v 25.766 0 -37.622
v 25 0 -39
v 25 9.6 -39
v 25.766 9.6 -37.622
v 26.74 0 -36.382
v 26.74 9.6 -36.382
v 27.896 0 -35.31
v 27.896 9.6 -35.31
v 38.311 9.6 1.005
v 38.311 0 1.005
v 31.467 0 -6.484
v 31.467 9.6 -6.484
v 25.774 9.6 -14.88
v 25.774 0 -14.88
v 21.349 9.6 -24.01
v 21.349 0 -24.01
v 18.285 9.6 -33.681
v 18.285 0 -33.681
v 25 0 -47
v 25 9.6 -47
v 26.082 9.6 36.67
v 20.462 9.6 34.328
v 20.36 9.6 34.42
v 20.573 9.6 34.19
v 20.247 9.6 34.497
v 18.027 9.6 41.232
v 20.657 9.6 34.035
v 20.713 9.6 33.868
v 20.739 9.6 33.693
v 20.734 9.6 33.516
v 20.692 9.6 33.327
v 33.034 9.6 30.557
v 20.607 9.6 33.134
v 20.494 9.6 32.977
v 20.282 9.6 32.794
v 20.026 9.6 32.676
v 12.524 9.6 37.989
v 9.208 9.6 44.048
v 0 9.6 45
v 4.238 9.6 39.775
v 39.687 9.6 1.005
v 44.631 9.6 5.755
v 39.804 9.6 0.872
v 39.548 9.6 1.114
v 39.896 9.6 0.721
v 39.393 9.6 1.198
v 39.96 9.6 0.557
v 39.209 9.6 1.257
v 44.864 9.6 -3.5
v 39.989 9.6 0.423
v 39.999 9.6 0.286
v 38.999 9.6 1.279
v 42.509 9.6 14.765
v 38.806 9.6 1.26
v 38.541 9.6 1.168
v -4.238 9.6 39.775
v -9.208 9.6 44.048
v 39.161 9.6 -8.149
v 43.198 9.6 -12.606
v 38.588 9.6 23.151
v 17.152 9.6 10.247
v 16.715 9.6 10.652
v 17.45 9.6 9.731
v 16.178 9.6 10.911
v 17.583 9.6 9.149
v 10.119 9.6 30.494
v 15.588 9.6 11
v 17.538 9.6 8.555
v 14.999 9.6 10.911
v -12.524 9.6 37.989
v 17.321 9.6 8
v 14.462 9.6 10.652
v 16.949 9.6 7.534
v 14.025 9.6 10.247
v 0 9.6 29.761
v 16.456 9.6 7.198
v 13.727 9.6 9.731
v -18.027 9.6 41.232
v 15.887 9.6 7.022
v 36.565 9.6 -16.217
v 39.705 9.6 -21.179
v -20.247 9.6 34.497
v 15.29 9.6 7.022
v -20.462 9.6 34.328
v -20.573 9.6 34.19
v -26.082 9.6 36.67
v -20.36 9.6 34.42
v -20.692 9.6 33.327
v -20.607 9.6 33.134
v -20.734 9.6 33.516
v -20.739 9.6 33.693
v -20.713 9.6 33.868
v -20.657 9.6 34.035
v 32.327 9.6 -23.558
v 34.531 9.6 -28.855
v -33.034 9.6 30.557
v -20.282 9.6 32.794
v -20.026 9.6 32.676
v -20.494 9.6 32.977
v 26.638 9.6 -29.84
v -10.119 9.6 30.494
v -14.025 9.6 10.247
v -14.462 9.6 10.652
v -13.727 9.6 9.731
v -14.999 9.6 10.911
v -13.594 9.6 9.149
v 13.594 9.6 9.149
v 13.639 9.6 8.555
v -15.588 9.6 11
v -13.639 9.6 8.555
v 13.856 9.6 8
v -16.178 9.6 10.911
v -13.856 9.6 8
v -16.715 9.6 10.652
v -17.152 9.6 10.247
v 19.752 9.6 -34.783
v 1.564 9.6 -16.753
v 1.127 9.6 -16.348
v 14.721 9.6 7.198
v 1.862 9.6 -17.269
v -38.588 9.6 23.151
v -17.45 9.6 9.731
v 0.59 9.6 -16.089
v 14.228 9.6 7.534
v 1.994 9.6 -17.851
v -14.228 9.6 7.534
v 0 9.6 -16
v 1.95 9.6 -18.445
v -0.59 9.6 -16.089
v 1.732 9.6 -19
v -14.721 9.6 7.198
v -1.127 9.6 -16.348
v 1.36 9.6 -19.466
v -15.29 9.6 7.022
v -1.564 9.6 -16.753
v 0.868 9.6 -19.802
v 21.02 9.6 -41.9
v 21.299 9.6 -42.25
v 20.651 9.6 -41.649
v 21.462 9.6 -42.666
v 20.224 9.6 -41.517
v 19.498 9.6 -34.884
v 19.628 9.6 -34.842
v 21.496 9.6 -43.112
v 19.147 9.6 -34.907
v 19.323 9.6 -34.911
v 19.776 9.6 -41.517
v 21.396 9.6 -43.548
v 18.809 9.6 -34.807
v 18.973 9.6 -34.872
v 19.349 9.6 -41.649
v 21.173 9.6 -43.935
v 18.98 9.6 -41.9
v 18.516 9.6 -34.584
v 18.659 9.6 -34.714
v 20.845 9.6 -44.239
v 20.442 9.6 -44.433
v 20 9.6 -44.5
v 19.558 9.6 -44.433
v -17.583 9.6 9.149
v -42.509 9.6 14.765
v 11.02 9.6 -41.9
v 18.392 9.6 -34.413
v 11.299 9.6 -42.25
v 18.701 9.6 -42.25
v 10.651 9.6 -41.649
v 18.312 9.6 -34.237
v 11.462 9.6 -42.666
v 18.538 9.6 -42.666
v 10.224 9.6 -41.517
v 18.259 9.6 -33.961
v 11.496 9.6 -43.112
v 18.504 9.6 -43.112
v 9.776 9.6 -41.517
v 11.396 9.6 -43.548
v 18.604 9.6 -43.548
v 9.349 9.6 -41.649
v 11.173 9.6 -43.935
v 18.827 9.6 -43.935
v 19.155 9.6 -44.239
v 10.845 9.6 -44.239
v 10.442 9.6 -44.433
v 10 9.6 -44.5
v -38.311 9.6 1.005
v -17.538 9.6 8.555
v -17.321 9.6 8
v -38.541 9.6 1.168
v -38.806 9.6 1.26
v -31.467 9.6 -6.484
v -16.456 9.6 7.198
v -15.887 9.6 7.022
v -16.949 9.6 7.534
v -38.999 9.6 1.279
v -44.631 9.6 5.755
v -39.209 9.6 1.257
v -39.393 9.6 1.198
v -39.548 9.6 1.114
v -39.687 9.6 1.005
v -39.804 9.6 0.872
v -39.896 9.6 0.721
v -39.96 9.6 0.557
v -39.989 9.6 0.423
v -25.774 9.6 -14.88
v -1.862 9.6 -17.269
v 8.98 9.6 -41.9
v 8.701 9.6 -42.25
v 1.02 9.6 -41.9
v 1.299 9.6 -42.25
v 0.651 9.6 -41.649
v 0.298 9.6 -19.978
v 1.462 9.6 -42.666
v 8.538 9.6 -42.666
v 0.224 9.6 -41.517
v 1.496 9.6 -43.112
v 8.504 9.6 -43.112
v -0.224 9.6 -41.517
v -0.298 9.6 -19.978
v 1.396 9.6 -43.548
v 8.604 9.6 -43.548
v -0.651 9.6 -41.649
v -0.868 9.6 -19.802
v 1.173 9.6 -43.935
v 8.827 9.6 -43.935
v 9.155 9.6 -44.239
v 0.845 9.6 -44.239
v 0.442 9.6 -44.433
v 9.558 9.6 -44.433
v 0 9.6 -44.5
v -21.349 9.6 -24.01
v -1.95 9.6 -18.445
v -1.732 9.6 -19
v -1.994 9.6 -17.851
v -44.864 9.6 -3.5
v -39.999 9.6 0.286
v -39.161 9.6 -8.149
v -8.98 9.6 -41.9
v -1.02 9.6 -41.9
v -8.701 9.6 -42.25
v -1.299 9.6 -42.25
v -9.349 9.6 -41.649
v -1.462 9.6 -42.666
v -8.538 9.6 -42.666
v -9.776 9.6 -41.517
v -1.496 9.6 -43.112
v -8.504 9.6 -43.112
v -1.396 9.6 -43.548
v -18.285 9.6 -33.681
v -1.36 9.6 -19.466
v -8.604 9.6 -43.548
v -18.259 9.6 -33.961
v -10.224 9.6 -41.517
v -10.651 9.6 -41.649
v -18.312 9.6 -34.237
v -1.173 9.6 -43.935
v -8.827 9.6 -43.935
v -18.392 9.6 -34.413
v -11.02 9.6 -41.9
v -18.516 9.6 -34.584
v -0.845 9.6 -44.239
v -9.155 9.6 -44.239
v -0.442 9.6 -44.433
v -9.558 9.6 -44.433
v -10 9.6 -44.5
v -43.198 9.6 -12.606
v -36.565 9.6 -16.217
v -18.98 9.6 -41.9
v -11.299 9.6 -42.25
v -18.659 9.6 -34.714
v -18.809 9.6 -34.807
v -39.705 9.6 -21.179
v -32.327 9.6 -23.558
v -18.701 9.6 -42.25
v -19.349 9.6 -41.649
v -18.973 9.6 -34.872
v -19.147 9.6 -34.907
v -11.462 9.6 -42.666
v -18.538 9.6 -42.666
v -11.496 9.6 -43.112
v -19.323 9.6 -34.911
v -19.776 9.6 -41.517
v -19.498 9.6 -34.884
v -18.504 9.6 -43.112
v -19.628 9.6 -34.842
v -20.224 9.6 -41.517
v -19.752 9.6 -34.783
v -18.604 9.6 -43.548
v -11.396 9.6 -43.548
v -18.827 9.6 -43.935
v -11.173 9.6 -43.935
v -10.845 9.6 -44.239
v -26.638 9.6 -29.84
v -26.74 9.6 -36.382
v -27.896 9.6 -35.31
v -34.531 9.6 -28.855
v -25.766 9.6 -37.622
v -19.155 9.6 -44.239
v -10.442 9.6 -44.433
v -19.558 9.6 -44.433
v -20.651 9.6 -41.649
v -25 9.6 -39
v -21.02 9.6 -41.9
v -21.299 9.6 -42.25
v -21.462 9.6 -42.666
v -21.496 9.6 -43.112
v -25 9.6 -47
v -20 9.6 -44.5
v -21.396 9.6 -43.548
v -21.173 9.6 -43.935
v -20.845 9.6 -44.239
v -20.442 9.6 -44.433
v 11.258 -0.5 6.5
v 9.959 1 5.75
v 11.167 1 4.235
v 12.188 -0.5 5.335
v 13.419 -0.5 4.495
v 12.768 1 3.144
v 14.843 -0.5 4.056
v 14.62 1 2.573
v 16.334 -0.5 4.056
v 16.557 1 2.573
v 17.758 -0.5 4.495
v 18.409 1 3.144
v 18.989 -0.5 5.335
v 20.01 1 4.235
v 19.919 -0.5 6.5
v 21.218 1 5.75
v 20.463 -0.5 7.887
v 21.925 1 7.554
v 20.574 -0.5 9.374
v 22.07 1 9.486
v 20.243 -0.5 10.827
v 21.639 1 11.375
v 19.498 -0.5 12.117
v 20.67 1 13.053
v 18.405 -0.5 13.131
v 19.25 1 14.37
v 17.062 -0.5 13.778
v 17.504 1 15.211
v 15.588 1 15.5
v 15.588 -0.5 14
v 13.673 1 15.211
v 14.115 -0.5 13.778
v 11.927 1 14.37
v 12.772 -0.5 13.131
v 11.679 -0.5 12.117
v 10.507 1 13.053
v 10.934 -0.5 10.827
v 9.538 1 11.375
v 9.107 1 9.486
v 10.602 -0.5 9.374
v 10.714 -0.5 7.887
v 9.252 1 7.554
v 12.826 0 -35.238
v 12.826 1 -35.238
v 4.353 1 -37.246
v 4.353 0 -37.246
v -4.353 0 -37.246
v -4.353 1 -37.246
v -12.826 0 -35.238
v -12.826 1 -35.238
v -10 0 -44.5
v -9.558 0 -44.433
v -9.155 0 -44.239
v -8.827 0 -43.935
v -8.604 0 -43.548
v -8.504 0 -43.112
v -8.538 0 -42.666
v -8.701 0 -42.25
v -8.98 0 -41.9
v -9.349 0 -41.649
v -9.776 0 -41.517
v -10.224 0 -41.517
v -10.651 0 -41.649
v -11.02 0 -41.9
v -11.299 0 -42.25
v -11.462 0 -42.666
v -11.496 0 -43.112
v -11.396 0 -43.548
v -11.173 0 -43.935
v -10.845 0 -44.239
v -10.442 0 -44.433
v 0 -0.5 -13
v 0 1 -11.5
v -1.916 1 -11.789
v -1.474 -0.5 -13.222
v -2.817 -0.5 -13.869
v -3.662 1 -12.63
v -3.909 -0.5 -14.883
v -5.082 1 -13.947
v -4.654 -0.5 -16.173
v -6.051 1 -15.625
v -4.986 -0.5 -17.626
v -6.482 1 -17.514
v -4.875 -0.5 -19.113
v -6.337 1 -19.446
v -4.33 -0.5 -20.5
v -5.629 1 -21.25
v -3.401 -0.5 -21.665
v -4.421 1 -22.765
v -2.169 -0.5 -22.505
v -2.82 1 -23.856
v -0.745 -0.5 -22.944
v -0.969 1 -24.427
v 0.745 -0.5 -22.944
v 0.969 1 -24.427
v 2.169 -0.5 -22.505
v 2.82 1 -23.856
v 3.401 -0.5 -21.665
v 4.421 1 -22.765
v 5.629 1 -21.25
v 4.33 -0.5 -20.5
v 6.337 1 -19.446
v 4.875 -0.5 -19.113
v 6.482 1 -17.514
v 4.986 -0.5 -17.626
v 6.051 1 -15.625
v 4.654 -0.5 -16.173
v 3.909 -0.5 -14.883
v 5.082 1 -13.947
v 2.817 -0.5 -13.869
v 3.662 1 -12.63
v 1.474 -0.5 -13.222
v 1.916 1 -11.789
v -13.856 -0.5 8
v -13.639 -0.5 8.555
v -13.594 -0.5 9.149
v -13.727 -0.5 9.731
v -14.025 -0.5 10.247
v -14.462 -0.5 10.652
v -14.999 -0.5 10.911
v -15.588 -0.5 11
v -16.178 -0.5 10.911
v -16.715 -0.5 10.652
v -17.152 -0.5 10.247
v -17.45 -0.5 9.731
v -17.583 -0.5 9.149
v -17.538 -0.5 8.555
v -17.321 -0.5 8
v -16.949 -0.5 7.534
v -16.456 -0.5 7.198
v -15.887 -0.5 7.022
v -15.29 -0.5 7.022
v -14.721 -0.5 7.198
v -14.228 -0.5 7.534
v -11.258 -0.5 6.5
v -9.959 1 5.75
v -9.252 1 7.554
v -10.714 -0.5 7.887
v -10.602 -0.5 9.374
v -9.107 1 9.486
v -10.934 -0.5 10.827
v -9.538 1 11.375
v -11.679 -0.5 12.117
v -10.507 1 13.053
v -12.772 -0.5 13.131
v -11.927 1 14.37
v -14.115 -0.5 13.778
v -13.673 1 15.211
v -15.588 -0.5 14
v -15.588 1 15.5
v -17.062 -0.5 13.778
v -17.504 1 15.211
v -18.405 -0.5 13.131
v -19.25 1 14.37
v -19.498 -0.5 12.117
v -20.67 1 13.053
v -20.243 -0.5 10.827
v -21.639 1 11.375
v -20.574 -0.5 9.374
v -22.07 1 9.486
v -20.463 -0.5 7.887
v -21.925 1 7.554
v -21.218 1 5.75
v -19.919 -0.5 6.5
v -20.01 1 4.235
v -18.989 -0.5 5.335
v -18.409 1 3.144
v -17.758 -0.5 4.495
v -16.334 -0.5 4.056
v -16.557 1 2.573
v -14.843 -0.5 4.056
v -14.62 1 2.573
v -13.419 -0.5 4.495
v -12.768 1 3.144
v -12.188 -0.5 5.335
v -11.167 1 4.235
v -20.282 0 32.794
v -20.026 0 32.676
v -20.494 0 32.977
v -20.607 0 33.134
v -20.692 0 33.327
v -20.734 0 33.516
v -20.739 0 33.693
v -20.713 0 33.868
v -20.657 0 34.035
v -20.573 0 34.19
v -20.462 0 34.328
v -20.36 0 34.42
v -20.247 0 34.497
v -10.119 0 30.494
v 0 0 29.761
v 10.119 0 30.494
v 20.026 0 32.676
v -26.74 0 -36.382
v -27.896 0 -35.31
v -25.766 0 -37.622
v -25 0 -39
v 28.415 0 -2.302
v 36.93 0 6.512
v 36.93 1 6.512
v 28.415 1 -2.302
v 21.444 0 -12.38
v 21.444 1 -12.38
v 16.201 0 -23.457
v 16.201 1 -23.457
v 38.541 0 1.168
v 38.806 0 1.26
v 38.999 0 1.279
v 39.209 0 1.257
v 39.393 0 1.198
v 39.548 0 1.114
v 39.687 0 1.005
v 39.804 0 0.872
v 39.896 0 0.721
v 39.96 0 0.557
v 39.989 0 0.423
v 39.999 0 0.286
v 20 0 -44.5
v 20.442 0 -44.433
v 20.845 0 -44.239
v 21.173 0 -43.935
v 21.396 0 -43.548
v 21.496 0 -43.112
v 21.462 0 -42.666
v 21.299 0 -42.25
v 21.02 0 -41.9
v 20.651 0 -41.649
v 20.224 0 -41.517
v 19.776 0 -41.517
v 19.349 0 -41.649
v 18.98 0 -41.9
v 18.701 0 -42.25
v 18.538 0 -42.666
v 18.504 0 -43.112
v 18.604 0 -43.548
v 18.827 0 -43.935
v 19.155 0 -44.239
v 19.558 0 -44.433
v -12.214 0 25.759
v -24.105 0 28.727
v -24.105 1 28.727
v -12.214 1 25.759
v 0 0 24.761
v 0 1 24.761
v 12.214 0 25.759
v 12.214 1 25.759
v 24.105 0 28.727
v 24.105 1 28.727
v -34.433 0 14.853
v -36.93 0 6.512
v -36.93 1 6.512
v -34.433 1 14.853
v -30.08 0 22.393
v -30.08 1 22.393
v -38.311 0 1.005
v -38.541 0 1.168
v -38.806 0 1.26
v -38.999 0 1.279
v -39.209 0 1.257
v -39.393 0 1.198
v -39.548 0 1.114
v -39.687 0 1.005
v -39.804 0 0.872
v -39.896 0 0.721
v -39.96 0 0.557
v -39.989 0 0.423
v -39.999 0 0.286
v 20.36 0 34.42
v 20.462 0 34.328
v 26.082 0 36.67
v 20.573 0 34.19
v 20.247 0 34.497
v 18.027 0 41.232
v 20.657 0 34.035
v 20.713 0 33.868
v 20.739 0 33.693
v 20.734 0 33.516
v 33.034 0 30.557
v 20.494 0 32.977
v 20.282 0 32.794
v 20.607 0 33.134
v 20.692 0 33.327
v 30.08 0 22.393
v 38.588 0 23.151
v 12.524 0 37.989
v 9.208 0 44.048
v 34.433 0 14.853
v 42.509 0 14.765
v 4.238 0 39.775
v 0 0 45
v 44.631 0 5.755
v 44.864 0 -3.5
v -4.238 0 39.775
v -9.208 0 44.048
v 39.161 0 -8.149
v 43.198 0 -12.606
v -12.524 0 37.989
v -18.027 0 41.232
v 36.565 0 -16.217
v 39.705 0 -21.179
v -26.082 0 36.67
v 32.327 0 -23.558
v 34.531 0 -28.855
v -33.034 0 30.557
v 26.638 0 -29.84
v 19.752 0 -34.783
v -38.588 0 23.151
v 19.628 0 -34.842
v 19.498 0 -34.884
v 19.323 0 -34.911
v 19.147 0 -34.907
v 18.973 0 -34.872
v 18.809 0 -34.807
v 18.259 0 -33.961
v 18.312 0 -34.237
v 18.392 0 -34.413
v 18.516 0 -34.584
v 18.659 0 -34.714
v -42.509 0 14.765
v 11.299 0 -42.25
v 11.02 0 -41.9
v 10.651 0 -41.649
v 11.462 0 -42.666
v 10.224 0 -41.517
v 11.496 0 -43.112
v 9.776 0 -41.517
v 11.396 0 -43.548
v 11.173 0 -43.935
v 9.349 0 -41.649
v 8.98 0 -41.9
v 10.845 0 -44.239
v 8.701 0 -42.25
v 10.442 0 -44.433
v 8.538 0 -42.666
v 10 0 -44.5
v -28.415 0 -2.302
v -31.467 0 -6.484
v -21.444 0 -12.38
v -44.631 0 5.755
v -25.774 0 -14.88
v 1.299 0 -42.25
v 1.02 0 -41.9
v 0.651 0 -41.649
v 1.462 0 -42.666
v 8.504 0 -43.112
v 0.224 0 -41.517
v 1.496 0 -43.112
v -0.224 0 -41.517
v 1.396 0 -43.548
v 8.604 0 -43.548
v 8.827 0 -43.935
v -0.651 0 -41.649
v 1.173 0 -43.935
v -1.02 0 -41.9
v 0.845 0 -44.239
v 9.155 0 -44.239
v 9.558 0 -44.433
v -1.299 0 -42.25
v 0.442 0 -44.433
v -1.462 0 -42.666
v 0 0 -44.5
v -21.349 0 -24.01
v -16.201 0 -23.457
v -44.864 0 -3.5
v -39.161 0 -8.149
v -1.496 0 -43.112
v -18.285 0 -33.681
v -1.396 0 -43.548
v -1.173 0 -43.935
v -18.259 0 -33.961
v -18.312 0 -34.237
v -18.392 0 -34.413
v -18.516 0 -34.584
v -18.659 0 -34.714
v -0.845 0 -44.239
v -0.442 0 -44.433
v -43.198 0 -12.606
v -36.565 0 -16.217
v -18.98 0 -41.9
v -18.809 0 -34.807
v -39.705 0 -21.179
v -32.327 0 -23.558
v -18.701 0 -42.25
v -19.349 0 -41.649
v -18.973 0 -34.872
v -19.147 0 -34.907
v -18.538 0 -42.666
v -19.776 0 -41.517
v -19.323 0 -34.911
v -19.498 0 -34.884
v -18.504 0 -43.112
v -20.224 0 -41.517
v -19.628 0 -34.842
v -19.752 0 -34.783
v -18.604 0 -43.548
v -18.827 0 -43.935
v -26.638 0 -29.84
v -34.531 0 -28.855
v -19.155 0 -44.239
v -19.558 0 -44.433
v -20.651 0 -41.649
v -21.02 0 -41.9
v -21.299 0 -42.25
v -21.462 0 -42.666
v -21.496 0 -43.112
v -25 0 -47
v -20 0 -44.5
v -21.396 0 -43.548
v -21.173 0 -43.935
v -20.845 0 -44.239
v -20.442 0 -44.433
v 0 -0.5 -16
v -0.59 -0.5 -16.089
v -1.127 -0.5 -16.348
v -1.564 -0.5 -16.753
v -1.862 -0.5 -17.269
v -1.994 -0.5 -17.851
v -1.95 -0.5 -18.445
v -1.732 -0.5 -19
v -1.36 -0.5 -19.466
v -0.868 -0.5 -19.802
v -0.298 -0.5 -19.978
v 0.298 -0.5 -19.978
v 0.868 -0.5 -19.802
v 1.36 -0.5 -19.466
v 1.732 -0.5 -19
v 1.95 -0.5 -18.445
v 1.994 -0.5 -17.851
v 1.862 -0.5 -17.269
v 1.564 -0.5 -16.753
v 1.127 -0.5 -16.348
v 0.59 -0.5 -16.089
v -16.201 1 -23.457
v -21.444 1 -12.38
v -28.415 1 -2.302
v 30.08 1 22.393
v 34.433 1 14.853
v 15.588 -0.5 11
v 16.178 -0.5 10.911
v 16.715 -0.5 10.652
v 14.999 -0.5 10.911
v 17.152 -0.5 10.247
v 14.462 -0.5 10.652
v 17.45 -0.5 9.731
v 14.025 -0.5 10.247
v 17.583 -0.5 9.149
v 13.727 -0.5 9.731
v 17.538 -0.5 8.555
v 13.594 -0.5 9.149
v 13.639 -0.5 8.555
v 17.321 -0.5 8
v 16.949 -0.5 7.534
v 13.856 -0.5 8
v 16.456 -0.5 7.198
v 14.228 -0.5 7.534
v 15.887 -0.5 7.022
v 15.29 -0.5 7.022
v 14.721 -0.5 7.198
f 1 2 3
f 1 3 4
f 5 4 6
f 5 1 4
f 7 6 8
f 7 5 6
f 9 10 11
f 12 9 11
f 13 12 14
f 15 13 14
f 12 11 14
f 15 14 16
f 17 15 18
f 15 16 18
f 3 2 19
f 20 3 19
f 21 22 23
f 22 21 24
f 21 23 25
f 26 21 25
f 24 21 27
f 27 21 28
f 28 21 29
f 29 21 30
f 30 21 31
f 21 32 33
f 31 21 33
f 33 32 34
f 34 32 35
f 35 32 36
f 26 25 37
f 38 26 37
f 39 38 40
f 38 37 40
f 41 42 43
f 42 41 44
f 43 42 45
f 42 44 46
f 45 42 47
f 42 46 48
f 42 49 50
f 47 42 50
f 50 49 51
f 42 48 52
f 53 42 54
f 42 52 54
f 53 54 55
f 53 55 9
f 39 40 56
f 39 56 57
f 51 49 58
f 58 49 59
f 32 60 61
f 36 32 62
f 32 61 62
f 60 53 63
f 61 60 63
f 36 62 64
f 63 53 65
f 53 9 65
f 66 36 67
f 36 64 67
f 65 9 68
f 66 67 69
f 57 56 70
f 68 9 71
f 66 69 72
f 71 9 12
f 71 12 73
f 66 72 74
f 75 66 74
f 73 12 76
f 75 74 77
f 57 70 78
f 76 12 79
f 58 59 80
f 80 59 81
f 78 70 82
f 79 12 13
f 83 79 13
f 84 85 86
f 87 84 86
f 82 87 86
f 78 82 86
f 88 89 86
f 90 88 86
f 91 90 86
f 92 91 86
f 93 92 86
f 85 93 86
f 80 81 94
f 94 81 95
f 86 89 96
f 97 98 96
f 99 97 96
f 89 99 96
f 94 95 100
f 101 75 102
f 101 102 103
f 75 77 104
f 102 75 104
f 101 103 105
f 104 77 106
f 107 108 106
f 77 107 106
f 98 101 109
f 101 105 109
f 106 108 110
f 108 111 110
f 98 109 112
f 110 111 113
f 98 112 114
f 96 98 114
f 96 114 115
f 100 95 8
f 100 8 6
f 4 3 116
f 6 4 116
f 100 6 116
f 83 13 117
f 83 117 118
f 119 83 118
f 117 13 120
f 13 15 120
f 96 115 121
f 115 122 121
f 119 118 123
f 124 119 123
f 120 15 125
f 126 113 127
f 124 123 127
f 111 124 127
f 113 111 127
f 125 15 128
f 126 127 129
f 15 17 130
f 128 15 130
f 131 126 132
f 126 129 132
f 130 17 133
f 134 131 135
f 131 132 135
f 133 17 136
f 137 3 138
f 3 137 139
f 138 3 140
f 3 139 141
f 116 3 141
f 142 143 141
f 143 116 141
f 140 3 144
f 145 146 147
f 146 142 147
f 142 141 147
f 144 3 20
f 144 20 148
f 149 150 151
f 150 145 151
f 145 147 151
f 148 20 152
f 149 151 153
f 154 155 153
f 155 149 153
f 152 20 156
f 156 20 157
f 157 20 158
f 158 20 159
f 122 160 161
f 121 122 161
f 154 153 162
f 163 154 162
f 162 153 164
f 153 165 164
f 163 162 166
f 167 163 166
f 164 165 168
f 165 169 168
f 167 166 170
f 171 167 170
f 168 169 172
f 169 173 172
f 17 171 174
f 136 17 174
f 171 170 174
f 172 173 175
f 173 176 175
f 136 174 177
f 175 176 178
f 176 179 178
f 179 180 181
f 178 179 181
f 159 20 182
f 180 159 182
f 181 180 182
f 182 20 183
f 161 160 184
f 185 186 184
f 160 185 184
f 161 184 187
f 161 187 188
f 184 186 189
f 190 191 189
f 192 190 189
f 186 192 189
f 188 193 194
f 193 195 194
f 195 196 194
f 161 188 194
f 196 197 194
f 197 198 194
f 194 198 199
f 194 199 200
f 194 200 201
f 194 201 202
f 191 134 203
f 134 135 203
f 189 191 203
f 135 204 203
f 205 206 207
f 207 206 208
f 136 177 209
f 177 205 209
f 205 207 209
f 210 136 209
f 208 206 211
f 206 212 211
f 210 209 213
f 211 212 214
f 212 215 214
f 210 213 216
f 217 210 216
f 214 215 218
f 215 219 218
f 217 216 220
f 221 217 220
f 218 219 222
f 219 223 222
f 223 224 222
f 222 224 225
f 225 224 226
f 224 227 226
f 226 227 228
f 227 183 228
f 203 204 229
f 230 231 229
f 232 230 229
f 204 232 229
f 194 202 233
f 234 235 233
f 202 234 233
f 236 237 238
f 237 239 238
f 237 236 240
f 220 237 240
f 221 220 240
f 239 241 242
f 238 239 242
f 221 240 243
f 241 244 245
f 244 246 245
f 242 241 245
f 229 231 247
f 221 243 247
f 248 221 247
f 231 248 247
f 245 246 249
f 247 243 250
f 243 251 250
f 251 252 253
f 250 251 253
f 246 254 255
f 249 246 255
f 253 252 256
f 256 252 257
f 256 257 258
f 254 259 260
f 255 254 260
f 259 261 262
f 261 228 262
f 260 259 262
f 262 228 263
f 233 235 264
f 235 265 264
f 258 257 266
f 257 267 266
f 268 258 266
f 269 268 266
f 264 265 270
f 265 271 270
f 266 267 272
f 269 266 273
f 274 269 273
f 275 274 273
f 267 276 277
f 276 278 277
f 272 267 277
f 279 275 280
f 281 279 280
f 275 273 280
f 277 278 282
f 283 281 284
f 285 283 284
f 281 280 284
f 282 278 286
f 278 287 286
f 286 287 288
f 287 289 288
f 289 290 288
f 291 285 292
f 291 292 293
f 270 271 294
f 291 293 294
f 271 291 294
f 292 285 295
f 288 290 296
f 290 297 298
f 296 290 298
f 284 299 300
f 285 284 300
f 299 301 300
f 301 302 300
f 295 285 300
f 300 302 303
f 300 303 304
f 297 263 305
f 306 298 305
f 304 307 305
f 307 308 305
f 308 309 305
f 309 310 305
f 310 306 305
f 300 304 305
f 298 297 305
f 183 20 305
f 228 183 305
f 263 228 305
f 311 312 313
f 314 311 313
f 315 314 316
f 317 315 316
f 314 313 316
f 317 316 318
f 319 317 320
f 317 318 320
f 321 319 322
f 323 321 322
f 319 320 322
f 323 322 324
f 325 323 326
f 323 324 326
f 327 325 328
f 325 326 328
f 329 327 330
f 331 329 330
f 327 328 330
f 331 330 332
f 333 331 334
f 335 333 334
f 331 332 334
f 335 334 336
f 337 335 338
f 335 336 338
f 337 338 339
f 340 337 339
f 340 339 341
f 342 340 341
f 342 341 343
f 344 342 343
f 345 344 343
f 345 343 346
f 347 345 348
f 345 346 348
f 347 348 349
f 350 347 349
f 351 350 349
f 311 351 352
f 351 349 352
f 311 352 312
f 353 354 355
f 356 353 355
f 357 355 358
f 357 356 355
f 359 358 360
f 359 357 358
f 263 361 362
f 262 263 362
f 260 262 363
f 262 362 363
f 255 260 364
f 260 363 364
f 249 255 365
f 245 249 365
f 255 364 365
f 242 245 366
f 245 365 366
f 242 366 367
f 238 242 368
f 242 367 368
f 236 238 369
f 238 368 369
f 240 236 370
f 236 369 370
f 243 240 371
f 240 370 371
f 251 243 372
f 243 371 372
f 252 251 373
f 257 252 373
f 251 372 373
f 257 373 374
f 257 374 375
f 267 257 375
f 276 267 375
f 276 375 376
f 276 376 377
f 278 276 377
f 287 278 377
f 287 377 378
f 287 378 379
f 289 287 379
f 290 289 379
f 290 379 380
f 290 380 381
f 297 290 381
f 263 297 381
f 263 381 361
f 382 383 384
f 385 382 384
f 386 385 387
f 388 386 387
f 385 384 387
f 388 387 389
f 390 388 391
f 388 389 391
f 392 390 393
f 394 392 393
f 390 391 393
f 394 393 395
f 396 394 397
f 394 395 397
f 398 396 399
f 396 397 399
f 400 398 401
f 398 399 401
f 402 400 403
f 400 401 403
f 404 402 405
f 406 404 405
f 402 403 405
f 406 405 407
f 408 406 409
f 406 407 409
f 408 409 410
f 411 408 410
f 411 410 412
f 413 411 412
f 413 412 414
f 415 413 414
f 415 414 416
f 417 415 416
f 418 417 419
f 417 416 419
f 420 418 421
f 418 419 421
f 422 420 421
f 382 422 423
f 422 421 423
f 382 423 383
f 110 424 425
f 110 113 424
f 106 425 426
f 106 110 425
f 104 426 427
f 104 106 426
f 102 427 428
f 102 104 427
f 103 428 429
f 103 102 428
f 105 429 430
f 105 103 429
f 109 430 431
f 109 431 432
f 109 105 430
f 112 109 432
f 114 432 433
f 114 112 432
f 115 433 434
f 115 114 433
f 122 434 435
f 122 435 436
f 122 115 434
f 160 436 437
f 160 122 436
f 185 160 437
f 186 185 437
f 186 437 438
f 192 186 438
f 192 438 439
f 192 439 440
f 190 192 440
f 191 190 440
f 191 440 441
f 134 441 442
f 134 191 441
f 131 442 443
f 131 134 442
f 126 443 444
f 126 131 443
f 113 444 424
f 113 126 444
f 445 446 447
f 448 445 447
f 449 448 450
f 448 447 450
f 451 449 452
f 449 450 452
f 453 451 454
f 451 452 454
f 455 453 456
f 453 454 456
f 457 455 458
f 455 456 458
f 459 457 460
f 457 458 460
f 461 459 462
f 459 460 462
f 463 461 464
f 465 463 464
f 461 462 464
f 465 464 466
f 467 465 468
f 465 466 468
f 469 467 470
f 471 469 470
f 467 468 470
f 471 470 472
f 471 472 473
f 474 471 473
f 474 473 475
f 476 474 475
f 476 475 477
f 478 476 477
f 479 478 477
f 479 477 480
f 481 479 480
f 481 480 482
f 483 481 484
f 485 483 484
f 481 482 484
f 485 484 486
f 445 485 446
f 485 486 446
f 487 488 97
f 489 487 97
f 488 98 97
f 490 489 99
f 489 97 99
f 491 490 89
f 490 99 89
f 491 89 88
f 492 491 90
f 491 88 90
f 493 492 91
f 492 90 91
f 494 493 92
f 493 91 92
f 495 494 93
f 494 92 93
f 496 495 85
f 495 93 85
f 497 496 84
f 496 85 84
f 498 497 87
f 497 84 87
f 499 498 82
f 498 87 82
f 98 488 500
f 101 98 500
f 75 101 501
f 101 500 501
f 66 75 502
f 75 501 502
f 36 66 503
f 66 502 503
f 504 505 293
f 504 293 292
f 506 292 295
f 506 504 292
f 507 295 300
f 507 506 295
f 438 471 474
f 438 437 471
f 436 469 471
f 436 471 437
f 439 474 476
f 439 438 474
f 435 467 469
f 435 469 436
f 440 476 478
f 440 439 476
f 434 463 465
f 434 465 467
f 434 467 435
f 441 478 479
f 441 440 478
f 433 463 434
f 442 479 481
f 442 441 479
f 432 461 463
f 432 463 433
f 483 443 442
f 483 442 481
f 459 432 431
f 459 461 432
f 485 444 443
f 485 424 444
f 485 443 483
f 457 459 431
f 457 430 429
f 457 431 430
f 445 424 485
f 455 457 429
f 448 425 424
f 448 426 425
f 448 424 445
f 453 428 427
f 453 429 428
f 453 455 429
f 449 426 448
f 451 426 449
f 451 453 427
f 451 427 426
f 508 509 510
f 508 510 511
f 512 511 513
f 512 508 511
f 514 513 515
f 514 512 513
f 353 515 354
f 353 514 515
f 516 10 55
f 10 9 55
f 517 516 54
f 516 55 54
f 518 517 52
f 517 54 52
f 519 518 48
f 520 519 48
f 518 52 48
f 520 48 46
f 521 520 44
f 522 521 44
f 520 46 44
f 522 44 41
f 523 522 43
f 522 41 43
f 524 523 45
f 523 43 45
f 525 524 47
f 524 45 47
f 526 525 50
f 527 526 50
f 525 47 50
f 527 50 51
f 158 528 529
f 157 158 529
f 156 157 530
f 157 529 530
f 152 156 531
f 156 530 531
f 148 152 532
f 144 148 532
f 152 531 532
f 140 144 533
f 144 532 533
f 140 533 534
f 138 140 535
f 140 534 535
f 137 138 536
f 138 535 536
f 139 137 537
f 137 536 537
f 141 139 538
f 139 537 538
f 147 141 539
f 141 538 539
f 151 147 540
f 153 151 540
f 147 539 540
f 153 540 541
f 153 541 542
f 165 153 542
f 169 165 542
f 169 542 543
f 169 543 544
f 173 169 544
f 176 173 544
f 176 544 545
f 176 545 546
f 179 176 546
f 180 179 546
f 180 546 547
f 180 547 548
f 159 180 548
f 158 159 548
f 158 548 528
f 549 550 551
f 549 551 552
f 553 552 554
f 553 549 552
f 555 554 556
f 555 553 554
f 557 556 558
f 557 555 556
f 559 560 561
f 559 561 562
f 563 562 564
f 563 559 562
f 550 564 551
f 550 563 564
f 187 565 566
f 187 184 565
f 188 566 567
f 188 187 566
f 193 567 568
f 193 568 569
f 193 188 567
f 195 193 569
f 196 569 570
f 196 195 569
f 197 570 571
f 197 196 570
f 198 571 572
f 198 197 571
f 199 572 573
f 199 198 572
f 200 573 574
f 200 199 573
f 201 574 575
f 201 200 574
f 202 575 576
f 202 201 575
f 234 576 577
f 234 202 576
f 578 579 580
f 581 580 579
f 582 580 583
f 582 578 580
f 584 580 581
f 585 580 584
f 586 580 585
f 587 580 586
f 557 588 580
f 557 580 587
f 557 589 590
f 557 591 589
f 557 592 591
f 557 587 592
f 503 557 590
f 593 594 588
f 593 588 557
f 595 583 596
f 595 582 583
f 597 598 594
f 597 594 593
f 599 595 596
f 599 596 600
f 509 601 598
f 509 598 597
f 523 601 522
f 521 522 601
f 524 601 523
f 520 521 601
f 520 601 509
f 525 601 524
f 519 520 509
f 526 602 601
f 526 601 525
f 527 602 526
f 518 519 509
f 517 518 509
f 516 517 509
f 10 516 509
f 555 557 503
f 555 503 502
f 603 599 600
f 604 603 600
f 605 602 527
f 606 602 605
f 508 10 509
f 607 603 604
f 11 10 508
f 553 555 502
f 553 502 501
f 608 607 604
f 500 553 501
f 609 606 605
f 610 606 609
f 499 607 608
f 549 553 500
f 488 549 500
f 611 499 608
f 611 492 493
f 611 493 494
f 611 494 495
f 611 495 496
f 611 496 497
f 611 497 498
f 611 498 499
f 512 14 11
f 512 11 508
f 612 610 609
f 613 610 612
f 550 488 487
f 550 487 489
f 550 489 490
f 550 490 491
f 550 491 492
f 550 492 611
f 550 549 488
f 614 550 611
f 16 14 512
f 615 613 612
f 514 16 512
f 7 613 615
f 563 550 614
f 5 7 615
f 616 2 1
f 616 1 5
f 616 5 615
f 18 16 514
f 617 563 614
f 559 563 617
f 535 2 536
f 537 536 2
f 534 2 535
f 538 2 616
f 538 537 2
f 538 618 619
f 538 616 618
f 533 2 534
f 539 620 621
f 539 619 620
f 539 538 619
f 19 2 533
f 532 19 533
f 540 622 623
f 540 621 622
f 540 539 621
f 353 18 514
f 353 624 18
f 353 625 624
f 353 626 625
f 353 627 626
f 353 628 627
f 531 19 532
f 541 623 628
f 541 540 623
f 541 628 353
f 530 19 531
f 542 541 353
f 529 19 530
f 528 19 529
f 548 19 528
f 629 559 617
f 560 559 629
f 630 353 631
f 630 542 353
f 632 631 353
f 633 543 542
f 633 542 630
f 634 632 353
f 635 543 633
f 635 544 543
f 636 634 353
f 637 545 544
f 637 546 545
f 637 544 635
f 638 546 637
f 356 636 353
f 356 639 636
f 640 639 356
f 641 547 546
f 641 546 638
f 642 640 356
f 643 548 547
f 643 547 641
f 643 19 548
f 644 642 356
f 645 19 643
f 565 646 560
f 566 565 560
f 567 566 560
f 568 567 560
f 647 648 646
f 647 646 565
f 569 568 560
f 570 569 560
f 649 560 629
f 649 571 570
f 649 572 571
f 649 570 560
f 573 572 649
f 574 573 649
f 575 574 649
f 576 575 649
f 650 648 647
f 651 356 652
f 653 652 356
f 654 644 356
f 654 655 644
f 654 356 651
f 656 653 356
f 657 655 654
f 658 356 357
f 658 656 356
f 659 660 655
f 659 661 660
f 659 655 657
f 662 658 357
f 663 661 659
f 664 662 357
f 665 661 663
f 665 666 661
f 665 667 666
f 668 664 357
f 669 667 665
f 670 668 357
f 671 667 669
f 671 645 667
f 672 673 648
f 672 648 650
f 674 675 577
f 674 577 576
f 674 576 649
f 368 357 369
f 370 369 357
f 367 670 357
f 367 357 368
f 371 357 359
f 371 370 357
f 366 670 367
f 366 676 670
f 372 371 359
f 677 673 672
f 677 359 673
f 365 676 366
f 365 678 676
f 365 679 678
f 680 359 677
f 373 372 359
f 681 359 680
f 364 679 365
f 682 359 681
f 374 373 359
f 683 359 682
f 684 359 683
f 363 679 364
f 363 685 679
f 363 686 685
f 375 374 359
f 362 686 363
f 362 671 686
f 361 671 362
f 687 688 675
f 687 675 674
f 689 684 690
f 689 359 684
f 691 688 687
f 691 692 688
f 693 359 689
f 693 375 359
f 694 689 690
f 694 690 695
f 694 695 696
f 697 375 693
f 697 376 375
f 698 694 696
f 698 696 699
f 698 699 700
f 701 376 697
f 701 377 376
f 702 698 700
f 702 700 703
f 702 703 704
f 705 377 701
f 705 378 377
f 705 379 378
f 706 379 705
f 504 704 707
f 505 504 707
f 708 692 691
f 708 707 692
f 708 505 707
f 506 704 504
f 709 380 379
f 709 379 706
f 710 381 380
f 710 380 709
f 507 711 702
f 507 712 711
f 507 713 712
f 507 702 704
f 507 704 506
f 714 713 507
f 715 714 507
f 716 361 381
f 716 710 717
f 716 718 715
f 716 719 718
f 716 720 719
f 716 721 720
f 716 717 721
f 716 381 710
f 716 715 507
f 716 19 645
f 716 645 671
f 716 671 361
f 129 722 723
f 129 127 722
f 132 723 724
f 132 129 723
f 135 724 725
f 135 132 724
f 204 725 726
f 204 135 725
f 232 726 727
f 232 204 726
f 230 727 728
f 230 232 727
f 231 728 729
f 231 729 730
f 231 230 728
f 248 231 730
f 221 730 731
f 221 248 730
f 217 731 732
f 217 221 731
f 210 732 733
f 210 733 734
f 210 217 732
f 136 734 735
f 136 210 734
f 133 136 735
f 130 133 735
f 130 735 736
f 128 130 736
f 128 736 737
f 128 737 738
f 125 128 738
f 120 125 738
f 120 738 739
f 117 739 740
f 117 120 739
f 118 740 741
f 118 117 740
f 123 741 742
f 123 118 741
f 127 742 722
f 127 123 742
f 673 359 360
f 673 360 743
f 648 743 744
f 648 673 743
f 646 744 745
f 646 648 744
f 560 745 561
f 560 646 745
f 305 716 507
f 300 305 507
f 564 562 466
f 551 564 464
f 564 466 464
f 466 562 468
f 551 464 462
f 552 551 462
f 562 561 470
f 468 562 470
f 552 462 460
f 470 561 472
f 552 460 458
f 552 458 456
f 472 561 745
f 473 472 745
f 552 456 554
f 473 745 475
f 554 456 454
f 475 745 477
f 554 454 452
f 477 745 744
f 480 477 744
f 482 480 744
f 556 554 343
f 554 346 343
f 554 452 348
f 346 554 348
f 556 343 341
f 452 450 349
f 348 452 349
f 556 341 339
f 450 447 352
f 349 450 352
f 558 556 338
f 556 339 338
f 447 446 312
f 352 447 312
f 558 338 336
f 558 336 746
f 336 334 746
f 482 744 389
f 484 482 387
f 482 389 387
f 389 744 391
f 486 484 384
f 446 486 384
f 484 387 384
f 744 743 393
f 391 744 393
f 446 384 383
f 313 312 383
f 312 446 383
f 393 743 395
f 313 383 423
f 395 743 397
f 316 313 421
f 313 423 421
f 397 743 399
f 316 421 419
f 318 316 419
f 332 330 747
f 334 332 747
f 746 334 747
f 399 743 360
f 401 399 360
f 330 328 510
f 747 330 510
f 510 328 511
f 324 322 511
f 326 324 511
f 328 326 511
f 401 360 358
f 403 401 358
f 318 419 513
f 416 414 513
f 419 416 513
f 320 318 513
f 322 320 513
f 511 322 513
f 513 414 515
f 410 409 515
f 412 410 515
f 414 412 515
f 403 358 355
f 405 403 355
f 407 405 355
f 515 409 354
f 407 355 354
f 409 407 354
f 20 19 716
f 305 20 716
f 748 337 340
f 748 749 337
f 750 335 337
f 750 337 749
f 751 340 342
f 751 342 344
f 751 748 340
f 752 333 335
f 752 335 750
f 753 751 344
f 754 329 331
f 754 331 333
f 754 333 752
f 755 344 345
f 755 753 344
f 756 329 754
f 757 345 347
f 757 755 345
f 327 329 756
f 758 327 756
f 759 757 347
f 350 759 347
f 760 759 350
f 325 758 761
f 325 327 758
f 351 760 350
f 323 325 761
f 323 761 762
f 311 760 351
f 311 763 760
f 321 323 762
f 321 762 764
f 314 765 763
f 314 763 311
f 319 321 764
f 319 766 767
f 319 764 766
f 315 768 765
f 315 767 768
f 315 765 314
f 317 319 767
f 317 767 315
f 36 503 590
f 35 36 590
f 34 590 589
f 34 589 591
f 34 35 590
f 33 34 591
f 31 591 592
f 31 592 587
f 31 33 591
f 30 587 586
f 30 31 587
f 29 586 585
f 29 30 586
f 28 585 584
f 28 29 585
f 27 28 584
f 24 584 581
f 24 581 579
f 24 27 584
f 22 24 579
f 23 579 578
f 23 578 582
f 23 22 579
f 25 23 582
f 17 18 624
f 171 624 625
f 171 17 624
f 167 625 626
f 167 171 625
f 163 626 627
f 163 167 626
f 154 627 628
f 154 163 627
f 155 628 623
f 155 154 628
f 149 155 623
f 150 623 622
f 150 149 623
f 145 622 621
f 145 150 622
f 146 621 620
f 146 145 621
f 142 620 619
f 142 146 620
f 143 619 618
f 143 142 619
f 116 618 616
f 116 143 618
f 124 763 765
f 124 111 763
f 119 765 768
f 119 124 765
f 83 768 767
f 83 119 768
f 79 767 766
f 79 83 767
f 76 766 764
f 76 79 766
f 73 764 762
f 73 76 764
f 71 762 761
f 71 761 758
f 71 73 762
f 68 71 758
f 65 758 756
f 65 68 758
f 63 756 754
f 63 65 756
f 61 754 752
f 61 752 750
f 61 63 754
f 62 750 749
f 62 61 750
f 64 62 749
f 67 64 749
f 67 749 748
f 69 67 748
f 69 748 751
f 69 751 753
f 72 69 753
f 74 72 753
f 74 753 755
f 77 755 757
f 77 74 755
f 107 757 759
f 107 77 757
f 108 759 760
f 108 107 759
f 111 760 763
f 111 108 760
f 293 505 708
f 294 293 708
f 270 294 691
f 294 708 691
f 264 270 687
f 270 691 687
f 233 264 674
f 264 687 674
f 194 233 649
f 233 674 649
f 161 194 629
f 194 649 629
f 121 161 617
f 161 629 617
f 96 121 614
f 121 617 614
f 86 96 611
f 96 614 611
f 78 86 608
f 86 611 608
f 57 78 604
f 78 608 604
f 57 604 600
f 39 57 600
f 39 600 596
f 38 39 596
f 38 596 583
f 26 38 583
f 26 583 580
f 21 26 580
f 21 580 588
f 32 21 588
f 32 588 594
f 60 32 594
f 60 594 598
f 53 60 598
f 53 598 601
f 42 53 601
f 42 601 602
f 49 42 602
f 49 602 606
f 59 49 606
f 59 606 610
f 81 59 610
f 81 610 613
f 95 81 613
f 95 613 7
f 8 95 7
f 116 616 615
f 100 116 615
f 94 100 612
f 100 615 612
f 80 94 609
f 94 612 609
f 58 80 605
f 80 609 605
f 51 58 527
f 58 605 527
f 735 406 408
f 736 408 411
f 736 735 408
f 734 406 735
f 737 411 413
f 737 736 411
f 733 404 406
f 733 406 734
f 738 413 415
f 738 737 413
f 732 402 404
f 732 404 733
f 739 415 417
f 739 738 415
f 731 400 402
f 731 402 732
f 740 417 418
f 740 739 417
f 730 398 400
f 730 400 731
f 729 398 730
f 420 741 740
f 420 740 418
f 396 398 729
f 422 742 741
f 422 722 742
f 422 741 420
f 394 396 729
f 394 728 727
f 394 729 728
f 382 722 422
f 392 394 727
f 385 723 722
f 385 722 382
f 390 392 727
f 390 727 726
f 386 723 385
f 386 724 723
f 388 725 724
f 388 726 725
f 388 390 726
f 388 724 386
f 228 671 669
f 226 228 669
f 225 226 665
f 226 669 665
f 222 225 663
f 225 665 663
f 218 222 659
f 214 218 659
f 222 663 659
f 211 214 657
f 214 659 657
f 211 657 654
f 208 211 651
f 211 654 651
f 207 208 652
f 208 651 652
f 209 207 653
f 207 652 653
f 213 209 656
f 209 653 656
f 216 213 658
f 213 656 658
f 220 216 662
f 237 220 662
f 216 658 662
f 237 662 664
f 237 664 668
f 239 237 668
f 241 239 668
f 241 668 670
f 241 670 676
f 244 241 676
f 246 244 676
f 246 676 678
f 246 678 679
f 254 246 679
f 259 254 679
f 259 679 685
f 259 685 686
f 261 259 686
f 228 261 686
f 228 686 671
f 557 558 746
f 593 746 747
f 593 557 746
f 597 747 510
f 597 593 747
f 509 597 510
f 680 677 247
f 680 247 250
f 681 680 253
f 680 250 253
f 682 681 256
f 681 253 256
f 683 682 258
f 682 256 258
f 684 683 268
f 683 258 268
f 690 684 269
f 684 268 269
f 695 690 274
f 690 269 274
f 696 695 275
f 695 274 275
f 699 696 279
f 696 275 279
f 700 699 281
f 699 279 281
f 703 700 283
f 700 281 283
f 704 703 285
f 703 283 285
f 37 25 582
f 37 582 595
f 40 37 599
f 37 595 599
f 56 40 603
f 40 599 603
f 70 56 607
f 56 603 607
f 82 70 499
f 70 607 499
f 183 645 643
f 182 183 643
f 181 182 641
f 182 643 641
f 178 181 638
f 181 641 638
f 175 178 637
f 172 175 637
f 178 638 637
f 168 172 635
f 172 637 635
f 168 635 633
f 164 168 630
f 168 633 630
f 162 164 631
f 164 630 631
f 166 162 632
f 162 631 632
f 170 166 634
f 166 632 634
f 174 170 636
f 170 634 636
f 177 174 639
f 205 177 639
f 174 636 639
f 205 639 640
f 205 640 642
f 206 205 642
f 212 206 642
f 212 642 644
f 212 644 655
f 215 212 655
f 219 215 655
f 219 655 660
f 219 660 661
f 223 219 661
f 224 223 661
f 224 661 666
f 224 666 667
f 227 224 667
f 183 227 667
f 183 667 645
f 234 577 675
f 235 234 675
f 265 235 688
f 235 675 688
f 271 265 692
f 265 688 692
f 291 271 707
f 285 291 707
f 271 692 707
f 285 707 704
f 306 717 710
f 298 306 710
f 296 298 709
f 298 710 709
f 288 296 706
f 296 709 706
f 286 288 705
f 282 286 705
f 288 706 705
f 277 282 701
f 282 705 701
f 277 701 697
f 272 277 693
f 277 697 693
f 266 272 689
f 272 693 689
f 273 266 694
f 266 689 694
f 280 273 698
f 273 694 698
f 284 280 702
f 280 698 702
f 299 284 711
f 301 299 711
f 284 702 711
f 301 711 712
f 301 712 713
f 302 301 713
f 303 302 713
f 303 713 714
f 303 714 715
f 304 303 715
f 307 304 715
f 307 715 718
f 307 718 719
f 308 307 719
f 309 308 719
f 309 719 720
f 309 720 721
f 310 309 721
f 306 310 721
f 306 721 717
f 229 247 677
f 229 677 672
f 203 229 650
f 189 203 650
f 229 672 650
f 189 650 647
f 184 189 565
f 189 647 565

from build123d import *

# Parameters (mm, degrees)
SKETCH1_R                    = 37.5
BOSS_EXTRUDE1_DEPTH          = 9.6
CUT_EXTRUDE2_START           = -9.6
CUT_EXTRUDE2_DEPTH           = 9.6
SKETCH4_R                    = 45
SKETCH4_R_2                  = 37.5
BOSS_EXTRUDE2_DEPTH          = 9.6
BOSS_EXTRUDE3_START          = -8.6
BOSS_EXTRUDE3_DEPTH          = 8.6
SKETCH7_R                    = 2
CUT_EXTRUDE3_DEPTH           = 65.359614666
SKETCH14_R                   = 5
SKETCH14_R_2                 = 2
BOSS_EXTRUDE5_DEPTH          = 1.5
CHAMFER1_SIZE                = 1.5
CIRPATTERN2_COUNT            = 3
CHAMFER1_OF_CIRPATTERN2_SIZE = 1.5
BOSS_EXTRUDE4_START          = -9.6
BOSS_EXTRUDE4_DEPTH          = 9.6
FILLET1_R                    = 10
SKETCH12_R                   = 1.5
CUT_EXTRUDE6_DEPTH           = 66.773550915
LPATTERN1_COUNT              = 10
LPATTERN1_PITCH              = 10
CUT_EXTRUDE7_DEPTH           = 66.773550915
FILLET3_R                    = 1
CIRPATTERN3_COUNT            = 3
FILLET3_OF_CIRPATTERN3_R     = 1


# Read off the part's stored shape, not the designer's step: Cut-Extrude2
# Some blends are built 0.0001 mm under size
with BuildPart() as part:
    # Sketch1 → Boss-Extrude1 (new body)
    with BuildSketch(Plane(origin=(0, 0, 0), x_dir=(1, 0, 0), z_dir=(0, 1, 0))):
        with Locations(Location((0, 0, 0), (0, 0, 270))):
            Circle(SKETCH1_R)
    extrude(amount=BOSS_EXTRUDE1_DEPTH)

    # Cut-Extrude2 outline → Cut-Extrude2 (cut)
    with BuildSketch(Plane(origin=(0, 9.6, 0), x_dir=(1, 0, 0), z_dir=(0, 1, 0)).offset(CUT_EXTRUDE2_START)):
        with BuildLine():
            ThreePointArc((-24.104535363, -28.726666617), (0, -24.760936498), (24.104535363, -28.726666617))
            ThreePointArc((24.104535363, -28.726666617), (32.475952642, -18.75), (36.930290738, -6.511806663))
            ThreePointArc((36.930290738, -6.511806663), (21.443600029, 12.380468249), (12.825755375, 35.238473279))
            ThreePointArc((12.825755375, 35.238473279), (0, 37.5), (-12.825755375, 35.238473279))
            ThreePointArc((-12.825755375, 35.238473279), (-21.443600029, 12.380468249), (-36.930290738, -6.511806663))
            ThreePointArc((-36.930290738, -6.511806663), (-32.475952642, -18.75), (-24.104535363, -28.726666617))
        make_face()
    extrude(amount=CUT_EXTRUDE2_DEPTH, mode=Mode.SUBTRACT)

    # Sketch4 → Boss-Extrude2 (add)
    with BuildSketch(Plane(origin=(0, 0, 0), x_dir=(1, 0, 0), z_dir=(0, 1, 0))):
        with Locations(Location((0, 0, 0), (0, 0, 270))):
            Circle(SKETCH4_R)
        Circle(SKETCH4_R_2, mode=Mode.SUBTRACT)
    extrude(amount=BOSS_EXTRUDE2_DEPTH)

    # Sketch6 → Boss-Extrude3 (add)
    with BuildSketch(Plane(origin=(0, 9.6, 0), x_dir=(1, 0, 0), z_dir=(0, 1, 0)).offset(BOSS_EXTRUDE3_START)):
        with BuildLine():
            ThreePointArc((24.104535363, -28.726666617), (32.475952642, -18.75), (36.930290738, -6.511806663))
            ThreePointArc((36.930290738, -6.511806663), (21.443600029, 12.380468249), (12.825755375, 35.238473279))
            ThreePointArc((12.825755375, 35.238473279), (0, 37.5), (-12.825755375, 35.238473279))
            ThreePointArc((-12.825755375, 35.238473279), (-21.443600029, 12.380468249), (-36.930290738, -6.511806663))
            ThreePointArc((-36.930290738, -6.511806663), (-32.475952642, -18.75), (-24.104535363, -28.726666617))
            ThreePointArc((-24.104535363, -28.726666617), (0, -24.760936498), (24.104535363, -28.726666617))
        make_face()
    extrude(amount=BOSS_EXTRUDE3_DEPTH)

    # Sketch7 → Cut-Extrude3 (cut, through all)
    with BuildSketch(Plane(origin=(0, 9.6, 0), x_dir=(1, 0, 0), z_dir=(0, 1, 0))):
        with Locations(Location((0, 18, 0), (0, 0, 270))):
            Circle(SKETCH7_R)
    cut_extrude3 = extrude(amount=-CUT_EXTRUDE3_DEPTH, mode=Mode.SUBTRACT)

    # Sketch14 → Boss-Extrude5 (add)
    with BuildSketch(Plane.XZ.offset(-1)):
        with Locations(Location((0, -18, 0), (0, 0, 90))):
            Circle(SKETCH14_R)
        with Locations(Location((0, -18, 0), (0, 0, 90))):
            Circle(SKETCH14_R_2, mode=Mode.SUBTRACT)
    boss_extrude5 = extrude(amount=BOSS_EXTRUDE5_DEPTH)

    # Chamfer1
    chamfer1_edges = [part.edges().sort_by_distance(p)[0] for p in [
        (0, 1, -23),
    ]]
    chamfer(chamfer1_edges, length=CHAMFER1_SIZE - 0.0001)  # a hair under: the kernel refuses the full size

    # CirPattern2: Cut-Extrude3, Boss-Extrude5 ×3 about axis
    cirpattern2_axis = Axis((0, 0, 0), (0, 1, 0))
    add([cut_extrude3.rotate(cirpattern2_axis, i * 360 / CIRPATTERN2_COUNT) for i in range(1, CIRPATTERN2_COUNT)], mode=Mode.SUBTRACT)
    add([boss_extrude5.rotate(cirpattern2_axis, i * 360 / CIRPATTERN2_COUNT) for i in range(1, CIRPATTERN2_COUNT)])

    # Chamfer1 of CirPattern2
    chamfer1_of_cirpattern2_edges = [part.edges().sort_by_distance(p)[0] for p in [
        (-19.918584287, 1, 11.5),
        (19.918584287, 1, 11.5),
    ]]
    chamfer(chamfer1_of_cirpattern2_edges, length=CHAMFER1_OF_CIRPATTERN2_SIZE - 0.0001)  # a hair under: the kernel refuses the full size

    # Sketch11 → Boss-Extrude4 (add)
    with BuildSketch(Plane(origin=(0, 9.6, 0), x_dir=(1, 0, 0), z_dir=(0, 1, 0)).offset(BOSS_EXTRUDE4_START)):
        with BuildLine():
            ThreePointArc((-22.449944321, 39), (0, 45), (22.449944321, 39))
            Line((22.449944321, 39), (25, 39))
            Line((25, 39), (25, 47))
            Line((25, 47), (-25, 47))
            Line((-25, 47), (-25, 39))
            Line((-25, 39), (-22.449944321, 39))
        make_face()
    extrude(amount=BOSS_EXTRUDE4_DEPTH)

    # Fillet1
    # the kernel refuses this fillet: 10 mm, written as the material it adds along each edge
    with BuildSketch(Plane(origin=(-22.449944321, 0, -39), x_dir=(-1, 0, 0), z_dir=(0, 1, 0))) as fillet1_piece_1:
        with BuildLine():
            CenterArc((11.645047875, -4.157056285), FILLET1_R, 128.309485754, 27.126753117)
            ThreePointArc((5.445958385, 3.689681222), (2.79048981, 1.745195143), (0, 0))
            Line((0, 0), (2.550055679, 0))
        make_face()
    extrude(amount=9.6)
    with BuildSketch(Plane(origin=(22.449944321, 0, -39), x_dir=(1, 0, 0), z_dir=(0, 1, 0))) as fillet1_piece_2:
        with BuildLine():
            CenterArc((11.645047875, 4.157056285), FILLET1_R, 204.563761129, 27.126753117)
            ThreePointArc((5.445958385, -3.689681222), (2.79048981, -1.745195143), (0, 0))
            Line((0, 0), (2.550055679, 0))
        make_face()
    extrude(amount=9.6)

    # Sketch12 → Cut-Extrude6 (cut, through all)
    with BuildSketch(Plane.XZ):
        with Locations(Location((-20, -43, 0), (0, 0, 270))):
            Circle(SKETCH12_R)
    cut_extrude6 = extrude(amount=-CUT_EXTRUDE6_DEPTH, mode=Mode.SUBTRACT)

    # LPattern1: Cut-Extrude6 ×10
    with Locations(*[(i * LPATTERN1_PITCH, 0, 0) for i in range(1, LPATTERN1_COUNT)]):
        add(cut_extrude6, mode=Mode.SUBTRACT)

    # Sketch13 → Cut-Extrude7 (cut, through all)
    with BuildSketch(Plane.XZ):
        with BuildLine():
            ThreePointArc((-22.11228446, 33.332369792), (0, 29.760936498), (22.11228446, 33.332369792))
            ThreePointArc((22.11228446, 33.332369792), (0, 40), (-22.11228446, 33.332369792))
        make_face()
    cut_extrude7 = extrude(amount=-CUT_EXTRUDE7_DEPTH, mode=Mode.SUBTRACT)

    # Fillet3
    fillet3_edges = [part.edges().sort_by_distance(p)[0] for p in [
        (-22.11228446, 4.8, 33.332369792),
        (22.11228446, 4.8, 33.332369792),
    ]]
    fillet(fillet3_edges, radius=FILLET3_R)

    # CirPattern3: Cut-Extrude7 ×3 about axis
    cirpattern3_axis = Axis((0, 0, 0), (0, 1, 0))
    for i in range(1, CIRPATTERN3_COUNT):
        add(cut_extrude7.rotate(cirpattern3_axis, i * 360 / CIRPATTERN3_COUNT), mode=Mode.SUBTRACT)

    # Fillet3 of CirPattern3
    fillet3_of_cirpattern3_edges = [part.edges().sort_by_distance(p)[0] for p in [
        (39.922821238, 4.8, 2.483615182),
        (17.810536778, 4.8, -35.815984974),
        (-17.810536778, 4.8, -35.815984974),
        (-39.922821238, 4.8, 2.483615182),
    ]]
    fillet(fillet3_of_cirpattern3_edges, radius=FILLET3_OF_CIRPATTERN3_R)


solid = part.part
